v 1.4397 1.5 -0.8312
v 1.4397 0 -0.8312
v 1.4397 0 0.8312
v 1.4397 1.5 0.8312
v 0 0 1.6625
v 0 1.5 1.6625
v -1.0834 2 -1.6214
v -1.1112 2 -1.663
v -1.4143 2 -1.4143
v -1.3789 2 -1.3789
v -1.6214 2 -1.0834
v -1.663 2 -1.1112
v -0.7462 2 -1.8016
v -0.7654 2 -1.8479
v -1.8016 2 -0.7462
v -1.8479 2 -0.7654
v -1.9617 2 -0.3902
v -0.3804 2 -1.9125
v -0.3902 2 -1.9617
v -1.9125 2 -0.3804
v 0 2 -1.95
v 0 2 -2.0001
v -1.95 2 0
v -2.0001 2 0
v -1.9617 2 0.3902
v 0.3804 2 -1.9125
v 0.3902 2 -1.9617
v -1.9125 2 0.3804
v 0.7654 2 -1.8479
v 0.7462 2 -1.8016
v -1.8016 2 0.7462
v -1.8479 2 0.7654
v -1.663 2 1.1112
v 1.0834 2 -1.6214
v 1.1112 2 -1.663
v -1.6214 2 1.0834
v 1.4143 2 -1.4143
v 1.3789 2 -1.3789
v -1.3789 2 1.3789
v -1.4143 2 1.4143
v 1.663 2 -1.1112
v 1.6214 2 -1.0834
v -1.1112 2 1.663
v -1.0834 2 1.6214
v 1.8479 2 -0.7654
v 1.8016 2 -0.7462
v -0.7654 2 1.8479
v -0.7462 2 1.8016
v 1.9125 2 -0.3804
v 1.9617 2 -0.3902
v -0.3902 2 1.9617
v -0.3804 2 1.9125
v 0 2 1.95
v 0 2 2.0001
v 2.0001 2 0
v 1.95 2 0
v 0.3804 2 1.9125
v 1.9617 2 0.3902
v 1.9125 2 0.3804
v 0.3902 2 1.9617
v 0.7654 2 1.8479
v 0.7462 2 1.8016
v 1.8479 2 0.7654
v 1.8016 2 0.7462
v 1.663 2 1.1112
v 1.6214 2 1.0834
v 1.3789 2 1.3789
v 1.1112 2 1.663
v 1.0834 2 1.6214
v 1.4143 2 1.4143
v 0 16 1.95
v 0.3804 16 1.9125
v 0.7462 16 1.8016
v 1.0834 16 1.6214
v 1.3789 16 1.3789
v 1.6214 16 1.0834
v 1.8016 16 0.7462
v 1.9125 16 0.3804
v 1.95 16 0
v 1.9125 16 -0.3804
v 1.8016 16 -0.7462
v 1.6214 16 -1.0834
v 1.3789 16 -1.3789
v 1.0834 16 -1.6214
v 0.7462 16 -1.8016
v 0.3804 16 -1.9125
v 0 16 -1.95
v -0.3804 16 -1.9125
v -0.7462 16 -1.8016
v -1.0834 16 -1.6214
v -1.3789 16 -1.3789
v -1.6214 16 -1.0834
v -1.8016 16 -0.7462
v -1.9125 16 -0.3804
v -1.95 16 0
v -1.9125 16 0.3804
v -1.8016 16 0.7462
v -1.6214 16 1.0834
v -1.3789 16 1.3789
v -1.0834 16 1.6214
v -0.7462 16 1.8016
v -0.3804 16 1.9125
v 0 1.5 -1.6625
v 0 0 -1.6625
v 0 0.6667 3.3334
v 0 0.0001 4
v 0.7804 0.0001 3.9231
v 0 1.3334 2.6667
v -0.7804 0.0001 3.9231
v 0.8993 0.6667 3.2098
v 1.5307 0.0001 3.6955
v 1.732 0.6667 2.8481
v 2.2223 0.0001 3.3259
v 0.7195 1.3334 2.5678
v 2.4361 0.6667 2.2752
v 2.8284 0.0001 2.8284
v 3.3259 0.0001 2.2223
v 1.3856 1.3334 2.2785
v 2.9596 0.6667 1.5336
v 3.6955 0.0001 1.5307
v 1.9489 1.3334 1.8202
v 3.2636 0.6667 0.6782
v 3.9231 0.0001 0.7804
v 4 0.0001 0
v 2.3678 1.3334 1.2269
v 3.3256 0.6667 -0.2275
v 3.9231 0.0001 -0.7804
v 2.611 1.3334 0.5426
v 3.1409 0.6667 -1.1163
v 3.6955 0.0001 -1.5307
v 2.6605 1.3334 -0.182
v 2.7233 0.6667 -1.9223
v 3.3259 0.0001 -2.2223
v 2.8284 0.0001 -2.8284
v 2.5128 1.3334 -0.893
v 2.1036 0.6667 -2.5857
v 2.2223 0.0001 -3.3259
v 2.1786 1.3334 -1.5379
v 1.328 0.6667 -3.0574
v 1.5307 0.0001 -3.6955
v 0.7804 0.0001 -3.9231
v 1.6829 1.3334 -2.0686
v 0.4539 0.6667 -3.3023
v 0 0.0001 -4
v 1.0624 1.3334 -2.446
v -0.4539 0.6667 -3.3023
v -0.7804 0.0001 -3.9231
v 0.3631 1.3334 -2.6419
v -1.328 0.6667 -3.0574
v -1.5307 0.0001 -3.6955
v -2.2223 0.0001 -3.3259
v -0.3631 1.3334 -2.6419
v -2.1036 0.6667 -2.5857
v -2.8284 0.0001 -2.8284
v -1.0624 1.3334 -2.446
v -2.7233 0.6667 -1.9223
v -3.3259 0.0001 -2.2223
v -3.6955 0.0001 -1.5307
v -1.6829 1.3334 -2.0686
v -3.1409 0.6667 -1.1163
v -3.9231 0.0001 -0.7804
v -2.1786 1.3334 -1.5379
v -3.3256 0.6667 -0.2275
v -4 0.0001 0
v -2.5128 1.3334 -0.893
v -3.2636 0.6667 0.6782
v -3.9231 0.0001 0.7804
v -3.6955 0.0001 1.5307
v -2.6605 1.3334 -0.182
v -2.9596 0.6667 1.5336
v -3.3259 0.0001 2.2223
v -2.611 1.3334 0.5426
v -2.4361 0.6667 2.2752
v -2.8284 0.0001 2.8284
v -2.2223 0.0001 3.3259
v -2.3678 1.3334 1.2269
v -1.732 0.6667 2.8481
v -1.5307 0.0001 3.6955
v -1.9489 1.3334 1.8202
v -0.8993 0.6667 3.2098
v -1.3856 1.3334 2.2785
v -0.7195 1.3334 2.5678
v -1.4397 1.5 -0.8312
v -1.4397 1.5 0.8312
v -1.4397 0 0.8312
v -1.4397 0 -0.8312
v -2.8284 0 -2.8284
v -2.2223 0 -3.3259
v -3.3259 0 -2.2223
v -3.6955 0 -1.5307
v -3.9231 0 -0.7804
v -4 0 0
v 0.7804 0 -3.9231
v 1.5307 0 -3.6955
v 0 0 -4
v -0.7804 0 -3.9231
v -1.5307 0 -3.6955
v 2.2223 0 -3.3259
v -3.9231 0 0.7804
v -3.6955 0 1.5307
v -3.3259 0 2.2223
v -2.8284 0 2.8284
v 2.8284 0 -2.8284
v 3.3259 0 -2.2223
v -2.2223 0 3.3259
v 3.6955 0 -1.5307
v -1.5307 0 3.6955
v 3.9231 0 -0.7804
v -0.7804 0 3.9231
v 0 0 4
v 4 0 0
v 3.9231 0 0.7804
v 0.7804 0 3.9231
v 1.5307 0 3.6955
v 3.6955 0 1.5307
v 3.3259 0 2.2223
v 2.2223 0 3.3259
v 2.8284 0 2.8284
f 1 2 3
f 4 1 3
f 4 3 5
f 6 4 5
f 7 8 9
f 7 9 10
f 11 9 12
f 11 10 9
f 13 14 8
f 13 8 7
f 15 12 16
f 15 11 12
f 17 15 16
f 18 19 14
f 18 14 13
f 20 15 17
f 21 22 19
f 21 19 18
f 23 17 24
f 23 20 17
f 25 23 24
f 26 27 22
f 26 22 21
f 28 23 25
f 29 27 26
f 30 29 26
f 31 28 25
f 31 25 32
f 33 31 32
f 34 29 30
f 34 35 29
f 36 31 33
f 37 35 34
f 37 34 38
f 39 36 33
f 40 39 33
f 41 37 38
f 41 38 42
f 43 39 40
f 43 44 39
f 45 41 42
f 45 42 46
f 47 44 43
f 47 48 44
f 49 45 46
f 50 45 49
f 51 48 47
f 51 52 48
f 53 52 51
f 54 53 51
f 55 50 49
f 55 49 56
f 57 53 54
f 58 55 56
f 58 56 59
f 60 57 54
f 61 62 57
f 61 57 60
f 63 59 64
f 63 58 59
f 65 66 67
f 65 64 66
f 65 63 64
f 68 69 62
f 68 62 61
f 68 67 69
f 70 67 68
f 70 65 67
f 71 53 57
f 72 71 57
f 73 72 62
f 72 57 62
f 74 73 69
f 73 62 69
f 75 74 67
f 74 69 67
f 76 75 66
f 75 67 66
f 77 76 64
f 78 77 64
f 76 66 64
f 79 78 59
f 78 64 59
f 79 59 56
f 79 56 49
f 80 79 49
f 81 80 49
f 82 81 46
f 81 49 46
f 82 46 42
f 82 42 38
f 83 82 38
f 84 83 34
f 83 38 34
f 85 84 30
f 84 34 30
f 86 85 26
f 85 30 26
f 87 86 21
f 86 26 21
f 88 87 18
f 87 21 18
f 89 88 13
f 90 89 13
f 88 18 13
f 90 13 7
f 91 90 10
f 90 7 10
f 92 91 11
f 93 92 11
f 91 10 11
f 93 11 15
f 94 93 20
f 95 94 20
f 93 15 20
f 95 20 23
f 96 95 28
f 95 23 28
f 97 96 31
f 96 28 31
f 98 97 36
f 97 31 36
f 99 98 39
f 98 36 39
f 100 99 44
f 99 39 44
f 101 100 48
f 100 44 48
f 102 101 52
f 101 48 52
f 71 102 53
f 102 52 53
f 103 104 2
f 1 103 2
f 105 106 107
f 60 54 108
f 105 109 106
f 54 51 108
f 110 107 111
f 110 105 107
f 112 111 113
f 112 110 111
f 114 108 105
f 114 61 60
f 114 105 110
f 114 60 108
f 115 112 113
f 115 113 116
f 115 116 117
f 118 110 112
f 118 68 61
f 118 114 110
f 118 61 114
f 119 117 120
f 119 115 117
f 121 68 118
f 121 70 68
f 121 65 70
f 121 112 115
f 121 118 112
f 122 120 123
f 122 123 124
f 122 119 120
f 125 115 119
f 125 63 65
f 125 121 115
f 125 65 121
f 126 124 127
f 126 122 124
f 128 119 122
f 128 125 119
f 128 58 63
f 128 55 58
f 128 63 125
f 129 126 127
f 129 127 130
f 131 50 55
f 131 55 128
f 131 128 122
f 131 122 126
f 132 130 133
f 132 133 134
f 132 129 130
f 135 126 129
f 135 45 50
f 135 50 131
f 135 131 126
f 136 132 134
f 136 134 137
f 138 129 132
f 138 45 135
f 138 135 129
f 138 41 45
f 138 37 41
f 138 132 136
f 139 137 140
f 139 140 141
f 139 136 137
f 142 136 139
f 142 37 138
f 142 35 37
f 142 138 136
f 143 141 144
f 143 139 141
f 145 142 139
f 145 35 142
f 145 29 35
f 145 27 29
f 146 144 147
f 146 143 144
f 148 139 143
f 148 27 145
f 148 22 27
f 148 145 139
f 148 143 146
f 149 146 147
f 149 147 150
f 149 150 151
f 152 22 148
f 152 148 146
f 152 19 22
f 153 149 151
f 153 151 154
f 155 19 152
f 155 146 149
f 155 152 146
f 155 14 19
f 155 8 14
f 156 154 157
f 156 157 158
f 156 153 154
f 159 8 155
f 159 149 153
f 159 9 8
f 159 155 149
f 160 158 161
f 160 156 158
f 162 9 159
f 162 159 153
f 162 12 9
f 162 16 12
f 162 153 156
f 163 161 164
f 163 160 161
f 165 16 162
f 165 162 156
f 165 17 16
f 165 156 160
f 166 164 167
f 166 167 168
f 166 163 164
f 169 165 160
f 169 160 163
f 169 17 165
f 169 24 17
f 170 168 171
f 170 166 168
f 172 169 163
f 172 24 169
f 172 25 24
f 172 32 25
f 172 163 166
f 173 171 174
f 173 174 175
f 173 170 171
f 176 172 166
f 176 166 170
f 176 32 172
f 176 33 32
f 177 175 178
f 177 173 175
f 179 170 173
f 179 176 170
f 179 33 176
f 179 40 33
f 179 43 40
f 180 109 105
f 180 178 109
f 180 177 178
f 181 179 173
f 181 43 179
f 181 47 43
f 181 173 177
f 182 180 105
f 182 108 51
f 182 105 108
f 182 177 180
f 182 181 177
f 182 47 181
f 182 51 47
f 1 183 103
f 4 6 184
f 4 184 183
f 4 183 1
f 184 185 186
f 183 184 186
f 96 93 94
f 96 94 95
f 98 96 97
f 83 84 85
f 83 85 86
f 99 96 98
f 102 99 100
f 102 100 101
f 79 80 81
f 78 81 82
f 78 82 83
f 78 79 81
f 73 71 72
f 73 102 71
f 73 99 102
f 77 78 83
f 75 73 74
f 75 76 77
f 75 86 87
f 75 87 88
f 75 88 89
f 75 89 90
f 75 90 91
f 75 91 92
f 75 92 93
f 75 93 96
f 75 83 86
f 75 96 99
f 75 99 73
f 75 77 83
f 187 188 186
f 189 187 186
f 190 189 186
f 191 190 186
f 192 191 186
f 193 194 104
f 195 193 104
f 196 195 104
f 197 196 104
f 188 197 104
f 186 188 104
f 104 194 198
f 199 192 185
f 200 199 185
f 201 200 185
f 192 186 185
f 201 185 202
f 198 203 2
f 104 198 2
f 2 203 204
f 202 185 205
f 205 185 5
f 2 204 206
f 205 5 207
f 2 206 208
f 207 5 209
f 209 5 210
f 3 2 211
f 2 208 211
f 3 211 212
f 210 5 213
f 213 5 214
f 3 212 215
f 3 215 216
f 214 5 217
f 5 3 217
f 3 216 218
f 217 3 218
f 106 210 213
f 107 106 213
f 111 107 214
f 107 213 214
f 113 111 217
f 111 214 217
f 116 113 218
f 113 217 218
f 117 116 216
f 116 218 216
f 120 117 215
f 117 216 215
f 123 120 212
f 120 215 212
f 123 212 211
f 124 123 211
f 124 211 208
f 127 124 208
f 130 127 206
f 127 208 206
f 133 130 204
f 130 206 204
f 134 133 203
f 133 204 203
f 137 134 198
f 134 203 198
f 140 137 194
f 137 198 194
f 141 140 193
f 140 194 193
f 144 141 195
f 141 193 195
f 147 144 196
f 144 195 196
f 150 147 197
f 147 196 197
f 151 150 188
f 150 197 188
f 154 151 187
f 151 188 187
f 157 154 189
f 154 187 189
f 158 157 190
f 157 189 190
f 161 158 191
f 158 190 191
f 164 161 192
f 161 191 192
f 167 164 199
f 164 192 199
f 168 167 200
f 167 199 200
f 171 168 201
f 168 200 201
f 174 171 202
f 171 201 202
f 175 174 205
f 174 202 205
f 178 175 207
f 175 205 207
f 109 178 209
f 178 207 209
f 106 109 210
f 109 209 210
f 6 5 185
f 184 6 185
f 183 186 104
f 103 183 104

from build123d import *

# Parameters (mm, degrees)
SKETCH1_R           = 4
BOSS_EXTRUDE1_DEPTH = 2
SKETCH2_R           = 1.95
BOSS_EXTRUDE2_DEPTH = 14
CHAMFER1_SIZE       = 2
CUT_EXTRUDE1_DEPTH  = 1.5


with BuildPart() as part:
    # Sketch1 → Boss-Extrude1 (new body)
    with BuildSketch(Plane(origin=(0, 0, 0), x_dir=(1, 0, 0), z_dir=(0, 1, 0))):
        with Locations(Location((0, 0, 0), (0, 0, 270))):
            Circle(SKETCH1_R)
    extrude(amount=BOSS_EXTRUDE1_DEPTH)

    # Sketch2 → Boss-Extrude2 (add)
    with BuildSketch(Plane(origin=(0, 2, 0), x_dir=(1, 0, 0), z_dir=(0, 1, 0))):
        with Locations(Location((0, 0, 0), (0, 0, 270))):
            Circle(SKETCH2_R)
    extrude(amount=BOSS_EXTRUDE2_DEPTH)

    # Chamfer1
    chamfer1_edges = [part.edges().sort_by_distance(p)[0] for p in [
        (0, 2, -4),
    ]]
    chamfer(chamfer1_edges, length=CHAMFER1_SIZE - 0.0001)  # a hair under: the kernel refuses the full size

    # Sketch3 → Cut-Extrude1 (cut)
    with BuildSketch(Plane.XZ):
        Polygon((0, -1.662470902), (1.439742034, -0.831235451), (1.439742034, 0.831235451), (0, 1.662470902), (-1.439742034, 0.831235451), (-1.439742034, -0.831235451), align=None)
    extrude(amount=-CUT_EXTRUDE1_DEPTH, mode=Mode.SUBTRACT)


solid = part.part
